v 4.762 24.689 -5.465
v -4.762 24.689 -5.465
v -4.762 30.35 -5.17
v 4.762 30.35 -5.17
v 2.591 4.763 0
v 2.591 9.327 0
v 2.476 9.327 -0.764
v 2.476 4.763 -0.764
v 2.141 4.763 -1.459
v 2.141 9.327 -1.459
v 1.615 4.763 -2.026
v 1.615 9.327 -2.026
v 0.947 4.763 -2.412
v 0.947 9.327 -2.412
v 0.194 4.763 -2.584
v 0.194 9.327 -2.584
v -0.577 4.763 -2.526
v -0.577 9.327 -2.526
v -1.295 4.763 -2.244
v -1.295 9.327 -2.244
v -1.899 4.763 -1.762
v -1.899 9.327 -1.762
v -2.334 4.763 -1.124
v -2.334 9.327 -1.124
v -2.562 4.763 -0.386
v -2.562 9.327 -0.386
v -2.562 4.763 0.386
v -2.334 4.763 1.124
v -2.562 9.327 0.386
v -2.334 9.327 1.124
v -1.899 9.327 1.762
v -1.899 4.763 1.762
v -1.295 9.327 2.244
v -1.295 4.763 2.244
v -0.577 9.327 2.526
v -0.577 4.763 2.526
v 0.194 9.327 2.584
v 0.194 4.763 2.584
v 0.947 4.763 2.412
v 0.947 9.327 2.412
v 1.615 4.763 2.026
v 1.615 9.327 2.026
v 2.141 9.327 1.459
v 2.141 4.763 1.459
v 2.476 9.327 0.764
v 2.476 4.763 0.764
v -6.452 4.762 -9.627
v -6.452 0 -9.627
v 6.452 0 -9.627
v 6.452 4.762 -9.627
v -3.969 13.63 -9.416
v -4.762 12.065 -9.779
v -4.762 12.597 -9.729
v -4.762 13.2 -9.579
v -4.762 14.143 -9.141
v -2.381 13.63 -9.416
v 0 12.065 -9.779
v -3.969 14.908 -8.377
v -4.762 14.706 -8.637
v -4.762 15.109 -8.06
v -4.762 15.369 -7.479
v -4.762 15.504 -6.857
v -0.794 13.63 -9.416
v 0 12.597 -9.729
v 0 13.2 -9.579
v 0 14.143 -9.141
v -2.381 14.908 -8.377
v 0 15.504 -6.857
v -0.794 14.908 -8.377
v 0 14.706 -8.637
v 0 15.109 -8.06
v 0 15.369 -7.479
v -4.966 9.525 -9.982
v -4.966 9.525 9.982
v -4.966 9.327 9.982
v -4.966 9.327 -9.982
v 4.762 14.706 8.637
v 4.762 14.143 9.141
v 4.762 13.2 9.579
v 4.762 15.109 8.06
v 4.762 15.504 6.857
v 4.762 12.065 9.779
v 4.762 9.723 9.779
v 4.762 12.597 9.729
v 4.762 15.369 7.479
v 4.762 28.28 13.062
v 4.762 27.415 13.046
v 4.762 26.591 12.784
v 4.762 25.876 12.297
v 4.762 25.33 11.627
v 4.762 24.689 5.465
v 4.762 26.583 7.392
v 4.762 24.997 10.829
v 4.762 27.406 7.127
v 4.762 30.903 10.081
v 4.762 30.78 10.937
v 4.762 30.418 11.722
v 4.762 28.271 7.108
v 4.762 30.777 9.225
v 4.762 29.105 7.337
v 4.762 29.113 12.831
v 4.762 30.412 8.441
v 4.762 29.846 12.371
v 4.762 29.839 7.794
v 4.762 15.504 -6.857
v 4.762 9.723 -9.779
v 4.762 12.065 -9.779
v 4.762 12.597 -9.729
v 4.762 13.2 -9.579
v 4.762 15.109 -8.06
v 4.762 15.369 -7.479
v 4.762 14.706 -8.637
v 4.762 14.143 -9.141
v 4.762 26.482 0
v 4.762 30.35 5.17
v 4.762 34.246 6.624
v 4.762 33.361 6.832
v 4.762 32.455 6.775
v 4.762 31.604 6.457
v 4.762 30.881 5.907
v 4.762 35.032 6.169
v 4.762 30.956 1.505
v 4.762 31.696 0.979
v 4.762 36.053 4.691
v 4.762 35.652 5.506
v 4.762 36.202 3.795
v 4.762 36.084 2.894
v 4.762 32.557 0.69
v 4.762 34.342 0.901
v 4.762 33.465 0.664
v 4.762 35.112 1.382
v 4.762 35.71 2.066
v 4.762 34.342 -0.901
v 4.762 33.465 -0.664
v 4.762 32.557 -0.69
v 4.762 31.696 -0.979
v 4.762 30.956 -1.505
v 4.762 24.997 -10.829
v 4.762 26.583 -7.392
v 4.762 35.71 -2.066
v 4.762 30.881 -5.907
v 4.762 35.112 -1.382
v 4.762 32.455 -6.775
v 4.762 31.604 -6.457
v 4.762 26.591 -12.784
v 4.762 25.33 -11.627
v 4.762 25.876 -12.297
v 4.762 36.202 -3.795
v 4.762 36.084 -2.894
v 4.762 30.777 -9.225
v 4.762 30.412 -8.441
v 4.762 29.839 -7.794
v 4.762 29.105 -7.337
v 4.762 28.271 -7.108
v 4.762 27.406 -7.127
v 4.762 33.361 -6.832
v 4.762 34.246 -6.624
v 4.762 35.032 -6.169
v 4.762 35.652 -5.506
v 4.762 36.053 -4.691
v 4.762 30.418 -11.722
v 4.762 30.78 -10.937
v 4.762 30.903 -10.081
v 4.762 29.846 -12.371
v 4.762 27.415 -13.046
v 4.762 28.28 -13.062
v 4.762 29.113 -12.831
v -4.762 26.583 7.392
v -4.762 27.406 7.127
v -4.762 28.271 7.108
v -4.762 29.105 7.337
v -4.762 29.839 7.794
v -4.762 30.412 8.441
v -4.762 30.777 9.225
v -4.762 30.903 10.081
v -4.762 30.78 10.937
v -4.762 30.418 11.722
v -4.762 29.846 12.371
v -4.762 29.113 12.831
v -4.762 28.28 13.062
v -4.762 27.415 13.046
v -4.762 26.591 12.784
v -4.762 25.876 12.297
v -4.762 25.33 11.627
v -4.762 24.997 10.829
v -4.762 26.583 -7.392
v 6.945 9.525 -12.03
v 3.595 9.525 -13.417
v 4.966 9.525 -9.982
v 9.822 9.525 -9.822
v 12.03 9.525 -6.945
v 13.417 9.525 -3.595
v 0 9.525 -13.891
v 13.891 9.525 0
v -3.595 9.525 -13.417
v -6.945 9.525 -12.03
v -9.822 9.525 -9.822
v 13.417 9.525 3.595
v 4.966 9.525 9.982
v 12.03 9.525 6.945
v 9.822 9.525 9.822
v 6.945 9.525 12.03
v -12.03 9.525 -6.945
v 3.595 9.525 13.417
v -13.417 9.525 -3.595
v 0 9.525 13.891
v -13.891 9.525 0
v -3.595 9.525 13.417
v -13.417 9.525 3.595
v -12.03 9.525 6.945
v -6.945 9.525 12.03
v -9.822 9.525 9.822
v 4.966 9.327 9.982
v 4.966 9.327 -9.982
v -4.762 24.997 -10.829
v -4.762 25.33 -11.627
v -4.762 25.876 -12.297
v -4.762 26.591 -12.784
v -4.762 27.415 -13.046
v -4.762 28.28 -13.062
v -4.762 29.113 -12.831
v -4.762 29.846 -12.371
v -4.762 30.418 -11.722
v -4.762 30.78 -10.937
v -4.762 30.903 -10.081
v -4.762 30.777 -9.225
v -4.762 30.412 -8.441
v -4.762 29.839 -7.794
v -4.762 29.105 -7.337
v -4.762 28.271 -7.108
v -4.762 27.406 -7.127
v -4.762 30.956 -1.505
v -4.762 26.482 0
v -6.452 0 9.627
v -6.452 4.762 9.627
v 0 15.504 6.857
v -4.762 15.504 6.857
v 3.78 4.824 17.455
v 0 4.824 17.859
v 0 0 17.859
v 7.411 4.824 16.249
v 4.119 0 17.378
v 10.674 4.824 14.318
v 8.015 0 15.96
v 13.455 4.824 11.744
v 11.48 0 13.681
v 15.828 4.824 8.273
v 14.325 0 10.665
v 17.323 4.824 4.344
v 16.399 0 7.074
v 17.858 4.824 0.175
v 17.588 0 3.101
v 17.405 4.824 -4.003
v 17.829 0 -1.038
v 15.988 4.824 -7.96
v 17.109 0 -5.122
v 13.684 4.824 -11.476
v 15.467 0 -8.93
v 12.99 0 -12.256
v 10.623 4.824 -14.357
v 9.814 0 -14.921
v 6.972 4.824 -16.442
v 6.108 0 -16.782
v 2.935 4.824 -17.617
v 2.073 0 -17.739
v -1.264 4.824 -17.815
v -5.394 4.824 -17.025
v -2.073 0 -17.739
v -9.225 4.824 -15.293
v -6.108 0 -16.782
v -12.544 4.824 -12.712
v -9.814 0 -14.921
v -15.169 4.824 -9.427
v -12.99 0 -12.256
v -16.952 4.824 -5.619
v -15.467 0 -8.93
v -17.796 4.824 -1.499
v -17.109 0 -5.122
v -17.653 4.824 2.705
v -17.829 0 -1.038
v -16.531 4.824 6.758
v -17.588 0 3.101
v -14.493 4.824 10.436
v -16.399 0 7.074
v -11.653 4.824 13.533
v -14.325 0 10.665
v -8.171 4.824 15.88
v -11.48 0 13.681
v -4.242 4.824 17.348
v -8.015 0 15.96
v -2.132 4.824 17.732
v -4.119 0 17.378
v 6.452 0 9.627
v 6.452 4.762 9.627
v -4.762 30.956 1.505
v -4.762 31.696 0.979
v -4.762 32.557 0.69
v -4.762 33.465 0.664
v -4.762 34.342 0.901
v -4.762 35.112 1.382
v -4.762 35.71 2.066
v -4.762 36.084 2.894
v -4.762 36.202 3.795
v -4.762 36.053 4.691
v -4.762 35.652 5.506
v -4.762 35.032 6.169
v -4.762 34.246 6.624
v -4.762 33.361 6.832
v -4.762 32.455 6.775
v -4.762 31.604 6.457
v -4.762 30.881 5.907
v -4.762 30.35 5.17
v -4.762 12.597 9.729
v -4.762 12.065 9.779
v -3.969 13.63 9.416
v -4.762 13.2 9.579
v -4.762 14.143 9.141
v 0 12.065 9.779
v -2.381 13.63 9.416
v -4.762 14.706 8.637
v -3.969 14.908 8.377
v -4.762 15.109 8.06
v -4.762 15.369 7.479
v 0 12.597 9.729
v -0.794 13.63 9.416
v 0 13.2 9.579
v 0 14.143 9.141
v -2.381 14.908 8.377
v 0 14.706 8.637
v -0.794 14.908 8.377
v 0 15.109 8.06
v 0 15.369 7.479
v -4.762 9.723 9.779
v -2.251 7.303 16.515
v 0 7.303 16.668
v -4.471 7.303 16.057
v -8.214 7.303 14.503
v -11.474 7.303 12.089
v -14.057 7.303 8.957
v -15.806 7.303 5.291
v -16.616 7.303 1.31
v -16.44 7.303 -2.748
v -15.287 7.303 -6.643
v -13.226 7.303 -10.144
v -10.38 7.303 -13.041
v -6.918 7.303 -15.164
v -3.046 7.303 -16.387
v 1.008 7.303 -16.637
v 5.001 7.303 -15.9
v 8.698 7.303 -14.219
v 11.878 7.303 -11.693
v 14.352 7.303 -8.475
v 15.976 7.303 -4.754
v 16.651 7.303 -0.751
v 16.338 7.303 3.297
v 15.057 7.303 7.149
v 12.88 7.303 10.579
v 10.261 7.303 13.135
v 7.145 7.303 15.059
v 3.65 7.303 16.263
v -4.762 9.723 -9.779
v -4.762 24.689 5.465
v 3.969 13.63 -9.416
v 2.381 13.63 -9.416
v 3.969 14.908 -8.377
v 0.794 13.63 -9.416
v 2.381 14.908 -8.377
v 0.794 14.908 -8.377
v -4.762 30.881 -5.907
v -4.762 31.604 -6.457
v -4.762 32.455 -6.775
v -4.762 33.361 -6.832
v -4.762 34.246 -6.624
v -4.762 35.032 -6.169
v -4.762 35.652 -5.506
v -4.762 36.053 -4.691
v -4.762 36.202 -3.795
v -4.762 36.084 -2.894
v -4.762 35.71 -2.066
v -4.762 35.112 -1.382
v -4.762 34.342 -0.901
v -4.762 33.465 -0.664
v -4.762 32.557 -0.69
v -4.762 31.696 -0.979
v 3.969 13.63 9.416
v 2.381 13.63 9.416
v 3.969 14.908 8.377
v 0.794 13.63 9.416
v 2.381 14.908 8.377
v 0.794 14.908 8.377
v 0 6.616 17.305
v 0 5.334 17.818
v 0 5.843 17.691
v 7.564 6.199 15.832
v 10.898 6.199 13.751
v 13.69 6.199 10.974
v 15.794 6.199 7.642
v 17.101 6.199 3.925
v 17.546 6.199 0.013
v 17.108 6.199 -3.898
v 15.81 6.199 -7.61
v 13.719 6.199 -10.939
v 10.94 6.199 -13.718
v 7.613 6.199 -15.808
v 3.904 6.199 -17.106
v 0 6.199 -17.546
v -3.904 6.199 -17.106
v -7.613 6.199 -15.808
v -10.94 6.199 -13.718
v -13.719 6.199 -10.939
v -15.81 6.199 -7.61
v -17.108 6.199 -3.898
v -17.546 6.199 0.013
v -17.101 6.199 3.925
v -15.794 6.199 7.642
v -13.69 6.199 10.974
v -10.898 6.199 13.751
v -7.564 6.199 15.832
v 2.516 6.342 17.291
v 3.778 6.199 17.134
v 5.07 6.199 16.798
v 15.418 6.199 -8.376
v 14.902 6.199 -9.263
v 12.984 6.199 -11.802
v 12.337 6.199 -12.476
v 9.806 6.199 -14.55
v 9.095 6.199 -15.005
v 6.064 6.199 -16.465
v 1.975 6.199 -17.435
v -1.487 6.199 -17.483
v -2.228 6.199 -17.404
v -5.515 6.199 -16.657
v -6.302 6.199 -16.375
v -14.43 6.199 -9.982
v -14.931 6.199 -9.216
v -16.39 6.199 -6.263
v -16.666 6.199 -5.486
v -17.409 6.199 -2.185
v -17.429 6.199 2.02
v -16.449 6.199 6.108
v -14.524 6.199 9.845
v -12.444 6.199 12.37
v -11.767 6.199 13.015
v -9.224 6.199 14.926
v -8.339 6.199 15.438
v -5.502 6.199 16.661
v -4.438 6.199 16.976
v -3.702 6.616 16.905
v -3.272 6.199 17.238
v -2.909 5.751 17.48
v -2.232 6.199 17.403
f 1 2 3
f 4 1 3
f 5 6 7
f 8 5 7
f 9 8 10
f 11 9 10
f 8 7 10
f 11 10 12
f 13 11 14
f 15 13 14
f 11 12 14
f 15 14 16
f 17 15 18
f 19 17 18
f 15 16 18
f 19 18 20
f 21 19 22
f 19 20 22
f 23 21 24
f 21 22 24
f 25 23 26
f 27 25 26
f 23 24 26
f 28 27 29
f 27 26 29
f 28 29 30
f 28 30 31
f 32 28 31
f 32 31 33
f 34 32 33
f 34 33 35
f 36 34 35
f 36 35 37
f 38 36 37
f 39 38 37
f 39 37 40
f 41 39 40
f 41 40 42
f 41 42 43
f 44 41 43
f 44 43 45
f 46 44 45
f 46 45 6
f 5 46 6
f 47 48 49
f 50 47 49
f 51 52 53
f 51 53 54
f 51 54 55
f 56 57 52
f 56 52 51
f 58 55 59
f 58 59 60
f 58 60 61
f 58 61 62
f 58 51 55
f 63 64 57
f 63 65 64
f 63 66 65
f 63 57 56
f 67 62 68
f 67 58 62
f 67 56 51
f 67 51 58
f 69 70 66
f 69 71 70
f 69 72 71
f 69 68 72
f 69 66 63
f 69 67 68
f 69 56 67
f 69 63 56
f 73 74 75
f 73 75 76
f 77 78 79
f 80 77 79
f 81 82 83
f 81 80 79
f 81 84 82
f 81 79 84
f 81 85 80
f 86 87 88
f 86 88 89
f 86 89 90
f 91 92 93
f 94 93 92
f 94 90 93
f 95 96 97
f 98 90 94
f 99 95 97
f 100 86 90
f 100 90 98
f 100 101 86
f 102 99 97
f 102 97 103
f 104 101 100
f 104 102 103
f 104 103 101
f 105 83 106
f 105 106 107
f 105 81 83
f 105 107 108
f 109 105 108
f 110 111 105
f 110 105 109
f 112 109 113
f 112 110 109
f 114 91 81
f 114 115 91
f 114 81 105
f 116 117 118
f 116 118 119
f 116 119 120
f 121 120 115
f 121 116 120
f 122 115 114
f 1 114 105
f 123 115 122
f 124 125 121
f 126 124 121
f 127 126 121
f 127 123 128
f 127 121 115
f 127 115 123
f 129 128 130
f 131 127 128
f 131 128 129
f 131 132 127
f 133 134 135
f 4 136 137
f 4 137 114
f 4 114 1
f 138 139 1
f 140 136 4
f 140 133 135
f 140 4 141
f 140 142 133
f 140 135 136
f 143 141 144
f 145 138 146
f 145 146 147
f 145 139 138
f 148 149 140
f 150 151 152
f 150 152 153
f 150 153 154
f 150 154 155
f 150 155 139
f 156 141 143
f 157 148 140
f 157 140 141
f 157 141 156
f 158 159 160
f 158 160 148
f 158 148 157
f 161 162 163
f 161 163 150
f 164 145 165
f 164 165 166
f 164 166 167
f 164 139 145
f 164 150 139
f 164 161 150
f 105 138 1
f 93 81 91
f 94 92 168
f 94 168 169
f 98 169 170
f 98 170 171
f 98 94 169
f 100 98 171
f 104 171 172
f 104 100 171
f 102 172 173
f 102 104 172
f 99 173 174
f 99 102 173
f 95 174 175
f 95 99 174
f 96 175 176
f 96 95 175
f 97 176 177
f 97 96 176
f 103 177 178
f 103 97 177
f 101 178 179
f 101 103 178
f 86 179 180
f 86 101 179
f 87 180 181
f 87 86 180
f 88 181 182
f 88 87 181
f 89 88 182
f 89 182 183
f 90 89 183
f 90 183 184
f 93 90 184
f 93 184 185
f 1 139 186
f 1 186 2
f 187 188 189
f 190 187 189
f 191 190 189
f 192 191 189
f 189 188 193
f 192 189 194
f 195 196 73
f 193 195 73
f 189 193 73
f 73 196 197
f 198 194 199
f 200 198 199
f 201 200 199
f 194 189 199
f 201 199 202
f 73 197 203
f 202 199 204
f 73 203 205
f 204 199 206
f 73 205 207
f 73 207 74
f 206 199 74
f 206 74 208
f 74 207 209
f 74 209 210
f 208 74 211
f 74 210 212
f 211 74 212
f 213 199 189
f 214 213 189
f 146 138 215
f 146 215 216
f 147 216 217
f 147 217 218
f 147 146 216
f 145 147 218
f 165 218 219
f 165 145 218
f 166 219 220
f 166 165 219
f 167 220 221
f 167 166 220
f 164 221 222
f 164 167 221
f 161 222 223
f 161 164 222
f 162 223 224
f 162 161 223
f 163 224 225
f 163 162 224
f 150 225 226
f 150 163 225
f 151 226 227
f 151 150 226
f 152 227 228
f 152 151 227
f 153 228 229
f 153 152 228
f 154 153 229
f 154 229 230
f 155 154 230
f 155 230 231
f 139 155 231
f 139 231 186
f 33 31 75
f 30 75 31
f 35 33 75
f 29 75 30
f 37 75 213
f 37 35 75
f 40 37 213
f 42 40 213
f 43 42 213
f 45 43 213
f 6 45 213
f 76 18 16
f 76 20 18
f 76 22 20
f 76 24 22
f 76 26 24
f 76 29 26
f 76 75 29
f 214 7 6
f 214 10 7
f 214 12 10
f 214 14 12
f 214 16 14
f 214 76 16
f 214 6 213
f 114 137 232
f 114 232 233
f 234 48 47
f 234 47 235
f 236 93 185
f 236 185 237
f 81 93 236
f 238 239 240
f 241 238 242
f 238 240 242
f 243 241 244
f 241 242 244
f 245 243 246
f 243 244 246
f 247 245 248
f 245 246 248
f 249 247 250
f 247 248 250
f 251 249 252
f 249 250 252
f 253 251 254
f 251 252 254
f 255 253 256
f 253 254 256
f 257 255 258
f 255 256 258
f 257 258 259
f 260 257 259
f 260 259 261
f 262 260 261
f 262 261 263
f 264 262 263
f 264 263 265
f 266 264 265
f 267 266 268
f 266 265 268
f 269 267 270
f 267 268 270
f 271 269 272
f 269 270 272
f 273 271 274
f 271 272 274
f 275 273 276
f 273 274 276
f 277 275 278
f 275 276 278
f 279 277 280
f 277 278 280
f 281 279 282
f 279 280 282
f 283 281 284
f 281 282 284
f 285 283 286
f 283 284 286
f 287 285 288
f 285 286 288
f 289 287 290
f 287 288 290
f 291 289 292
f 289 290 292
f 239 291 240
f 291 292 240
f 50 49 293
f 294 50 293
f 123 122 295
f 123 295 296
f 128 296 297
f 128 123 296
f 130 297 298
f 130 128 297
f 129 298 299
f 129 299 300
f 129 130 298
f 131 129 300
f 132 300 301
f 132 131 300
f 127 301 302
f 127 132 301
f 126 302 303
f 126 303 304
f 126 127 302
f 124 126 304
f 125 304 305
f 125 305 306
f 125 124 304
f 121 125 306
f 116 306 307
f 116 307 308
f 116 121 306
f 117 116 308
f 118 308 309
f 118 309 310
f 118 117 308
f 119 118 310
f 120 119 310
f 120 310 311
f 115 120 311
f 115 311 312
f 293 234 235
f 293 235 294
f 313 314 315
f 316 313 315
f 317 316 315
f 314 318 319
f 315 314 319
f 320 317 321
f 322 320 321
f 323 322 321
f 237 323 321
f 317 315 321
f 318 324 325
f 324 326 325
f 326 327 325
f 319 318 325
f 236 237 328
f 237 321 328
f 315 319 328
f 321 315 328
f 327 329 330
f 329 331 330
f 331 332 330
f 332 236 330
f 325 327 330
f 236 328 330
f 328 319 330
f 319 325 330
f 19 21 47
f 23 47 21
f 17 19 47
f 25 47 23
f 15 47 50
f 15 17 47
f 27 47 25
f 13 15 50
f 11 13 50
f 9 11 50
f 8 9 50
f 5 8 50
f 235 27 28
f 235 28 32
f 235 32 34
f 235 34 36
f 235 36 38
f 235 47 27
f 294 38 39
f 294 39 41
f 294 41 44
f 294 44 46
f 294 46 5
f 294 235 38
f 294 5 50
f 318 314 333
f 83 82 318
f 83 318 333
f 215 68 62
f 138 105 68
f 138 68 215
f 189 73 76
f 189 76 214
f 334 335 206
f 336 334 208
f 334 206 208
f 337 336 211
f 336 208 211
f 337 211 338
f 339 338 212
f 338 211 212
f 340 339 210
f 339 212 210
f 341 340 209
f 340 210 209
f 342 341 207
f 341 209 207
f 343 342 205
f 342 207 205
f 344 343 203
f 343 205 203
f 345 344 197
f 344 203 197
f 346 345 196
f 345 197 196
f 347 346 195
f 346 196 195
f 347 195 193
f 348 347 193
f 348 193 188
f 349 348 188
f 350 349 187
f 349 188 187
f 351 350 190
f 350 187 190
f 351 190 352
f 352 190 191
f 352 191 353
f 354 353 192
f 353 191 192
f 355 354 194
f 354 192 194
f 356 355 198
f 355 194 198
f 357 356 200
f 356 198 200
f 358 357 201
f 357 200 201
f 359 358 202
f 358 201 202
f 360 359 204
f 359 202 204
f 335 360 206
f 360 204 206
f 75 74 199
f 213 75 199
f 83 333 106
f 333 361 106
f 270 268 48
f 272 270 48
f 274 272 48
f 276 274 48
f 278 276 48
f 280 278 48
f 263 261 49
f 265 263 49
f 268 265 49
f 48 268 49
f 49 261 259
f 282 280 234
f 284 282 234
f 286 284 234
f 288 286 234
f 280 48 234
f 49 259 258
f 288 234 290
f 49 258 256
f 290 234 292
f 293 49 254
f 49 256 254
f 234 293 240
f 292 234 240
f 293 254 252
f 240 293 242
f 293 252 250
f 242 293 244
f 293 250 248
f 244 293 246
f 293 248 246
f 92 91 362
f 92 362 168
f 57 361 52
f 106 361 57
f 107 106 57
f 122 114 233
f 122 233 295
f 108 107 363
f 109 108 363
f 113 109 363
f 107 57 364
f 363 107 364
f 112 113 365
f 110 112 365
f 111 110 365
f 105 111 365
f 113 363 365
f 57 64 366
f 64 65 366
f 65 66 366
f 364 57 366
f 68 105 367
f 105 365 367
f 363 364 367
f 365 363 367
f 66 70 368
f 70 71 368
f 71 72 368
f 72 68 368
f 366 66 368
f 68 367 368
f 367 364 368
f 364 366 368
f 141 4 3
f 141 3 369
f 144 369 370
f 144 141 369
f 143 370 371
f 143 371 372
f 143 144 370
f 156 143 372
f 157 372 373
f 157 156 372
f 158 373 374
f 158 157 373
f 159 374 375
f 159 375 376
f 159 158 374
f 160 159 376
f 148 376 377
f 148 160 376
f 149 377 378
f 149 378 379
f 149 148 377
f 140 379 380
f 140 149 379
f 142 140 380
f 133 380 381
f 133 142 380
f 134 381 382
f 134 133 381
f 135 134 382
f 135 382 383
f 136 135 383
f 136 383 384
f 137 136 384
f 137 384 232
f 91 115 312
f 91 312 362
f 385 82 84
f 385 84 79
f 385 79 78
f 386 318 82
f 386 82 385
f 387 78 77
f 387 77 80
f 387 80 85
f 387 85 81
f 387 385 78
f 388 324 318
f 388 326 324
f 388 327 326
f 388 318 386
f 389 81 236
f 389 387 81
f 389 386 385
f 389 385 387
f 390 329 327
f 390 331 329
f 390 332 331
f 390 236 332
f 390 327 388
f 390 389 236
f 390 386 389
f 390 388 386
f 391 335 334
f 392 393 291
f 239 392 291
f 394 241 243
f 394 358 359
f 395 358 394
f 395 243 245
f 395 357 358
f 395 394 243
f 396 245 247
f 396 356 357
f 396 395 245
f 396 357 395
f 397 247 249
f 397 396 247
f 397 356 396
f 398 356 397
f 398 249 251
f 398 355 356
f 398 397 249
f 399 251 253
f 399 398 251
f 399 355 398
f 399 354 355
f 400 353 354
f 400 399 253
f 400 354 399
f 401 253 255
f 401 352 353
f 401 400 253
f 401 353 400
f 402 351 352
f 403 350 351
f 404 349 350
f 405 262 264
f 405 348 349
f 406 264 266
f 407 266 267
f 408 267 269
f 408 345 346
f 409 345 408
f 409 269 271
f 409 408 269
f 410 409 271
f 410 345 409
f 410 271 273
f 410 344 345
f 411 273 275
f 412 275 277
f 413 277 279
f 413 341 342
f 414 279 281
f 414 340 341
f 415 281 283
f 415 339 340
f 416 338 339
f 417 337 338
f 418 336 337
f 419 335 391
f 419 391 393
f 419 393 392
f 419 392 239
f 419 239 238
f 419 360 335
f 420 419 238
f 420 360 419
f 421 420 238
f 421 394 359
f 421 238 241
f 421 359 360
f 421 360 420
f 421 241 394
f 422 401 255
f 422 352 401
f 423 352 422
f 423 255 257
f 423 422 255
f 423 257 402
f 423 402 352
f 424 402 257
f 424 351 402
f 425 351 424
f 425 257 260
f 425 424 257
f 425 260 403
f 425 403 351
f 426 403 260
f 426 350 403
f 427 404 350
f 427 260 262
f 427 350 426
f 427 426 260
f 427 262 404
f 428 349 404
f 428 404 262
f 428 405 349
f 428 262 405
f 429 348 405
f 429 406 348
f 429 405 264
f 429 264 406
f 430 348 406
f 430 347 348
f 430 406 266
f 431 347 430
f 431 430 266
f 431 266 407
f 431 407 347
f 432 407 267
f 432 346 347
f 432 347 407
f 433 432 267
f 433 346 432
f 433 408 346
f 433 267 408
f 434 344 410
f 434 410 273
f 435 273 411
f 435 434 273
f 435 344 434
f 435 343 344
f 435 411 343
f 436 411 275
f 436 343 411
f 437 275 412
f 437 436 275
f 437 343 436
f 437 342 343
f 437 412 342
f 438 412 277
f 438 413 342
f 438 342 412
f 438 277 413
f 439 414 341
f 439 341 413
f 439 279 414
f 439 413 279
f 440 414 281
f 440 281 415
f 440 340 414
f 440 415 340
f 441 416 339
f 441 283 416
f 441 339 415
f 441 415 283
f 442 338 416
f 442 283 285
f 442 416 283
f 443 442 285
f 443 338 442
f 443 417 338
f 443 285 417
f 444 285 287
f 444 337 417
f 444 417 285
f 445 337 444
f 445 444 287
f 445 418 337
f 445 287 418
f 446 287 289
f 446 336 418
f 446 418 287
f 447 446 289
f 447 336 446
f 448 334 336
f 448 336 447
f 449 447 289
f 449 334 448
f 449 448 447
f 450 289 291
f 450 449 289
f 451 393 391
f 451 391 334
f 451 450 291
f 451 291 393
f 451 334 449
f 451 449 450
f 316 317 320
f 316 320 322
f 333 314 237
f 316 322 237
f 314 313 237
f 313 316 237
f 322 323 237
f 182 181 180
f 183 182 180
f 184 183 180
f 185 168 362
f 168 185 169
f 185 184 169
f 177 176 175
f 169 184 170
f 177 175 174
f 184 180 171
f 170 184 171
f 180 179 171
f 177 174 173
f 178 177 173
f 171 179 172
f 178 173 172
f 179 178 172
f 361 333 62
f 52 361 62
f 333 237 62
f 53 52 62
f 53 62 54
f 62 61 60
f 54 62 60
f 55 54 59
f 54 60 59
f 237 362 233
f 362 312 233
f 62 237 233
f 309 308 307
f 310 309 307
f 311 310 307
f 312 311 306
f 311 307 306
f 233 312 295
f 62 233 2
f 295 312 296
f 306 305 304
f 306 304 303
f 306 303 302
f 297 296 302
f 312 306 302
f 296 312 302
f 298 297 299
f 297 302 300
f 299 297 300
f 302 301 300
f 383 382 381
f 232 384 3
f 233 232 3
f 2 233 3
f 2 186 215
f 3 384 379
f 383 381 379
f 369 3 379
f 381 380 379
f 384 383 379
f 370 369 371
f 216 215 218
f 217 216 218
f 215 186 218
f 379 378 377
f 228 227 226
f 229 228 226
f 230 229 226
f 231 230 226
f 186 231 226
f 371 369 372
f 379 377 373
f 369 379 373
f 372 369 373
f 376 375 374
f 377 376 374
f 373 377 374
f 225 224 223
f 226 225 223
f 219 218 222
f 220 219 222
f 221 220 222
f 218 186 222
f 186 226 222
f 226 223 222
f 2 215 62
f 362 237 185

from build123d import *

# Parameters (mm, degrees)
SKETCH1_R                  = 17.859375
BOSS_EXTRUDE1_DEPTH        = 6.35
SKETCH3_W                  = 12.9032
SKETCH3_H                  = 19.2532
CUT_EXTRUDE1_DEPTH         = 4.7625
F_6_0_204_DIAMETER_HOLE1_D = 5.1816
BOSS_EXTRUDE2_DEPTH        = 4.7625
SKETCH7_W                  = 9.9314
SKETCH7_H                  = 19.9644
CUT_EXTRUDE2_DEPTH         = 0.1984375
FILLET1_R                  = 3.175


with BuildPart() as part:
    # Sketch1 → Boss-Extrude1 (new body)
    with BuildSketch(Plane(origin=(0, 0, 0), x_dir=(1, 0, 0), z_dir=(0, 1, 0))):
        with Locations(Location((0, 0, 0), (0, 0, 270))):
            Circle(SKETCH1_R)
    extrude(amount=BOSS_EXTRUDE1_DEPTH)

    # Sketch2 → Revolve1 (revolve)
    with BuildSketch(Plane.XY, mode=Mode.PRIVATE) as revolve1_sk:
        Polygon((-17.859375, 6.35), (-13.890625, 9.525), (0, 9.525), (0, 6.35), align=None)
    revolve(revolve1_sk.sketch.rotate(Axis((0, 9.525, 0), (0, -1, 0)), 270), axis=Axis((0, 9.525, 0), (0, -1, 0)))

    # Sketch3 → Cut-Extrude1 (cut)
    with BuildSketch(Plane.XZ):
        Rectangle(SKETCH3_W, SKETCH3_H)
    extrude(amount=-CUT_EXTRUDE1_DEPTH, mode=Mode.SUBTRACT)

    # #6 (0.204) Diameter Hole1 (through all)
    with Locations(Plane(origin=(0, 4.7625, 0), x_dir=(-1, 0, 0), z_dir=(0, -1, 0))):
        with Locations((0, 0)):
            Hole(F_6_0_204_DIAMETER_HOLE1_D / 2)


with BuildPart() as body_2:
    # Sketch6 → Boss-Extrude2 (new, symmetric)
    with BuildSketch(Plane(origin=(0, 0, 0), x_dir=(0, 0, -1), z_dir=(1, 0, 0))):
        with BuildLine():
            Line((-9.779, 9.525), (9.779, 9.525))
            Line((9.779, 9.525), (9.779, 12.065))
            add(Edge.make_bspline(
                [(9.779, 12.065), (9.779, 12.309468919), (9.701224749, 12.845188646), (9.453540753, 13.61203379), (9.03799011, 14.366209833), (8.40518758, 14.92489564), (7.66720928, 15.338035784), (7.129325135, 15.476256725), (6.857301174, 15.504401939)],
                knots=[0, 0, 0, 0, 0.148072564, 0.327673484, 0.488762491, 0.66561528, 0.833548992, 1, 1, 1, 1], degree=3))
            Line((6.857301174, 15.504401939), (10.828792805, 24.996727929))
            ThreePointArc((10.828792805, 24.996727929), (11.342694333, 30.627172731), (7.391685615, 26.582975214))
            Line((7.391685615, 26.582975214), (5.465367278, 24.689212217))
            Line((5.465367278, 24.689212217), (5.170285785, 30.349613138))
            ThreePointArc((5.170285785, 30.349613138), (4.248246661, 36.160523017), (1.5050265, 30.955566445))
            Line((1.5050265, 30.955566445), (0, 26.481966322))
            Line((0, 26.481966322), (-1.5050265, 30.955566445))
            ThreePointArc((-1.5050265, 30.955566445), (-4.248246661, 36.160523017), (-5.170285785, 30.349613138))
            Line((-5.170285785, 30.349613138), (-5.465367278, 24.689212217))
            Line((-5.465367278, 24.689212217), (-7.391685615, 26.582975214))
            ThreePointArc((-7.391685615, 26.582975214), (-11.342694333, 30.627172731), (-10.828792805, 24.996727929))
            Line((-10.828792805, 24.996727929), (-6.857301174, 15.504401939))
            add(Edge.make_bspline(
                [(-9.779, 12.065), (-9.779, 12.309468919), (-9.701224749, 12.845188646), (-9.453540753, 13.61203379), (-9.03799011, 14.366209833), (-8.40518758, 14.92489564), (-7.66720928, 15.338035784), (-7.129325135, 15.476256725), (-6.857301174, 15.504401939)],
                knots=[0, 0, 0, 0, 0.148072564, 0.327673484, 0.488762491, 0.66561528, 0.833548992, 1, 1, 1, 1], degree=3))
            Line((-9.779, 12.065), (-9.779, 9.525))
        make_face()
    extrude(amount=BOSS_EXTRUDE2_DEPTH, both=True)


with BuildPart() as cut_extrude2_tool:
    # Sketch7 → Cut-Extrude2 (new, symmetric)
    with BuildSketch(Plane(origin=(0, 9.525, 0), x_dir=(1, 0, 0), z_dir=(0, 1, 0))):
        Rectangle(SKETCH7_W, SKETCH7_H)
    extrude(amount=CUT_EXTRUDE2_DEPTH, both=True)


with BuildPart() as part_1:
    add(part.part)

    # Cut-Extrude2: cut by cut_extrude2_tool
    add(cut_extrude2_tool.part, mode=Mode.SUBTRACT)

    # Fillet1
    fillet1_edges = [part_1.edges().sort_by_distance(p)[0] for p in [
        (0, 6.35, -17.859375),
    ]]
    fillet(fillet1_edges, radius=FILLET1_R)


with BuildPart() as body_2_1:
    add(body_2.part)

    # Cut-Extrude2: cut by cut_extrude2_tool
    add(cut_extrude2_tool.part, mode=Mode.SUBTRACT)


solid = Compound([part_1.part, body_2_1.part])
